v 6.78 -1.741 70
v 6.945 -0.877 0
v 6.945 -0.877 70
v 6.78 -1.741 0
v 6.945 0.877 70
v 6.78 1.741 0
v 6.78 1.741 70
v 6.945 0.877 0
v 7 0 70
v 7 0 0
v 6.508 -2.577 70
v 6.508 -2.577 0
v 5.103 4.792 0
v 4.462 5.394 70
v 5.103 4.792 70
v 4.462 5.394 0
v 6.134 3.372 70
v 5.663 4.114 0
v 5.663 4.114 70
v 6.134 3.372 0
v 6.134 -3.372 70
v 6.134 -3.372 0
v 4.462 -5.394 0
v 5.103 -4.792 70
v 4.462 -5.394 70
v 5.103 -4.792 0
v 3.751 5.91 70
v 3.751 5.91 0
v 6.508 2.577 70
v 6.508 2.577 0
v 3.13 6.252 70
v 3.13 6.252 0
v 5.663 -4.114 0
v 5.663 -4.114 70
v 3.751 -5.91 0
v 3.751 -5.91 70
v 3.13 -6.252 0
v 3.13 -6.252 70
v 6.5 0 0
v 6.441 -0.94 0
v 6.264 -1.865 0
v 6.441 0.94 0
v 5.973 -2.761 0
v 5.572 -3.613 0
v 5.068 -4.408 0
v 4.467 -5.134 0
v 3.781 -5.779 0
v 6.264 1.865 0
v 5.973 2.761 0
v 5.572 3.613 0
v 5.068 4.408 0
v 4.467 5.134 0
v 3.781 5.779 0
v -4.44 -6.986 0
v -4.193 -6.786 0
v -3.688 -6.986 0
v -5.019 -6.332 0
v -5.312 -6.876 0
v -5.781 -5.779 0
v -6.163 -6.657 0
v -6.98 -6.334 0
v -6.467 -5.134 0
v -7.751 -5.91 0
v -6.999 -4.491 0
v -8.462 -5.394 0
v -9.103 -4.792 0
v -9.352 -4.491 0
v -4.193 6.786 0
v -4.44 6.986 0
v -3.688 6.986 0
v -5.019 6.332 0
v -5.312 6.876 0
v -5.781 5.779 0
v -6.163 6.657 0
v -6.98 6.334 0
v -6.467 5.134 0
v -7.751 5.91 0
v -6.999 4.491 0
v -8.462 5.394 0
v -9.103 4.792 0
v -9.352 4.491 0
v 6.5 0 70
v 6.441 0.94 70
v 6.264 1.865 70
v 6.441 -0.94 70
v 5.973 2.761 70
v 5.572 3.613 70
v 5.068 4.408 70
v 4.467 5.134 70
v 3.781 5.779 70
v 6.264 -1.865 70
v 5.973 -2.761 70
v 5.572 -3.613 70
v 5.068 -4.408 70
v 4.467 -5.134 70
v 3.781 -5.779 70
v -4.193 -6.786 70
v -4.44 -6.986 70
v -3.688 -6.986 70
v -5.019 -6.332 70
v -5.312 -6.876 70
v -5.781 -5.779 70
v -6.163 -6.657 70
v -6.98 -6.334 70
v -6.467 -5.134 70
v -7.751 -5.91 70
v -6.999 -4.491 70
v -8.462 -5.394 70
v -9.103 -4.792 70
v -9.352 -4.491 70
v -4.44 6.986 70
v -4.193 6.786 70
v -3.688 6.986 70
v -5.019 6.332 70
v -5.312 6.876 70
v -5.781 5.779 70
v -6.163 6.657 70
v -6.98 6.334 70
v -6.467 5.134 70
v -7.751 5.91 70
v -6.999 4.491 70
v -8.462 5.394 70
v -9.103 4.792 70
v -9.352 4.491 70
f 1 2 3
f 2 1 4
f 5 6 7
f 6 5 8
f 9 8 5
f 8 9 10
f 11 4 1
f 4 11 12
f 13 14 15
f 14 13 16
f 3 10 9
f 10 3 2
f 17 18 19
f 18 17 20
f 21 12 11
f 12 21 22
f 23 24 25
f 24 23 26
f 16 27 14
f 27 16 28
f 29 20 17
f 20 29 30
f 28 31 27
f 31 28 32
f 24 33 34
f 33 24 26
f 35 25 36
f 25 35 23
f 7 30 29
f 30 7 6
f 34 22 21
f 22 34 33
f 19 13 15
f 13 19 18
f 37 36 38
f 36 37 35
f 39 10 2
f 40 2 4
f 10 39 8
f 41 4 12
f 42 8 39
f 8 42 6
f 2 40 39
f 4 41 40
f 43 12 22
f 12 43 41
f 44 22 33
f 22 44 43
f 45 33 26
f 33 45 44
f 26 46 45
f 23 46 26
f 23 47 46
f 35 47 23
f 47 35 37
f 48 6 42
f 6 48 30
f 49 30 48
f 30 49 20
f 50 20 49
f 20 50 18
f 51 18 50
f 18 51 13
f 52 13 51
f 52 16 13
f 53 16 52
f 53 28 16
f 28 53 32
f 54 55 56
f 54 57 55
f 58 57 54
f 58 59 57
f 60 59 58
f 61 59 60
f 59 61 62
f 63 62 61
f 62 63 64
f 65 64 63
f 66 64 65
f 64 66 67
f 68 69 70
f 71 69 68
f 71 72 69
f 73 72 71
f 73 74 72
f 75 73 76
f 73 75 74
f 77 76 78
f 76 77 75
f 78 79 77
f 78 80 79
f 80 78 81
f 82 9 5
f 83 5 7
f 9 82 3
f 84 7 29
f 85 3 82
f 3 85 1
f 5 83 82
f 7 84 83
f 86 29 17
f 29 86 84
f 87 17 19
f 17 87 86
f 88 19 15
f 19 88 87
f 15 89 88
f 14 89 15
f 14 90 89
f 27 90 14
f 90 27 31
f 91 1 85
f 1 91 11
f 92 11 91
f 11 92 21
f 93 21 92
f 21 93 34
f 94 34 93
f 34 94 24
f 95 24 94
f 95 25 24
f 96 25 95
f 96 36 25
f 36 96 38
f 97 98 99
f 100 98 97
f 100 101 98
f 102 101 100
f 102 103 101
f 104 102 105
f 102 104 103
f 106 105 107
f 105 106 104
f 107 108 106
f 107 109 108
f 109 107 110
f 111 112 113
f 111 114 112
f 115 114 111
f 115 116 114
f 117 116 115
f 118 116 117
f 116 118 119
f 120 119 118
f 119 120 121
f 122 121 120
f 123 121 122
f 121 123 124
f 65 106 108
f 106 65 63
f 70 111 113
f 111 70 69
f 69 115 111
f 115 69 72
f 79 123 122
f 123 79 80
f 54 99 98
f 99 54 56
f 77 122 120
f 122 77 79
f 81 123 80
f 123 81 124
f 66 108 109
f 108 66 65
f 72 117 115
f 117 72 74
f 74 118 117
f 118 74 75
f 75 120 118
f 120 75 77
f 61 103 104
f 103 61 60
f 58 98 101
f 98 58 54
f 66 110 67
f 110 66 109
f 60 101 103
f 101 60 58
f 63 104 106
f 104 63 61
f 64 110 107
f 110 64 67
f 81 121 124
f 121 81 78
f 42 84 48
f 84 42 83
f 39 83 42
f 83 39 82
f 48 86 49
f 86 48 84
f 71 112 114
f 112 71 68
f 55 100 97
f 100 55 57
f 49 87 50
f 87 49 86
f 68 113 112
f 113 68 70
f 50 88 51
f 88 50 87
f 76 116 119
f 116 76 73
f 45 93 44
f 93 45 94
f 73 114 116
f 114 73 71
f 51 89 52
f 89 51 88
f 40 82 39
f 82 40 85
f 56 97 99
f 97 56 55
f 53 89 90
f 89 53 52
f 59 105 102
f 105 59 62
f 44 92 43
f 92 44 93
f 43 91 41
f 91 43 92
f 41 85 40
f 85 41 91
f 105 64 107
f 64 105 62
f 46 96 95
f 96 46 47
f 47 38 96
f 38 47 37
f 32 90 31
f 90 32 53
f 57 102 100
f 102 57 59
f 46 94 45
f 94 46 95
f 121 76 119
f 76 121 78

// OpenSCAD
$fn = 50;


difference() {
	union() {
		cylinder(h = 70, r = 7.0000000000);
		translate(v = [-4.0000000000, 0, 0]) {
			cylinder(h = 70, r = 7.0000000000);
		}
	}
	union() {
		cylinder(h = 70, r = 3.2500000000);
		cylinder(h = 70, r = 1.8000000000);
		cylinder(h = 70, r = 1.8000000000);
		cylinder(h = 70, r = 1.8000000000);
		translate(v = [-8.5000000000, 0, 0]) {
			hull() {
				translate(v = [-3.7500000000, 0.0000000000, 0]) {
					cylinder(h = 70, r = 4.5000000000);
				}
				translate(v = [3.7500000000, 0.0000000000, 0]) {
					cylinder(h = 70, r = 4.5000000000);
				}
				translate(v = [-3.7500000000, -0.0000000000, 0]) {
					cylinder(h = 70, r = 4.5000000000);
				}
				translate(v = [3.7500000000, -0.0000000000, 0]) {
					cylinder(h = 70, r = 4.5000000000);
				}
			}
		}
		translate(v = [-1.0000000000, 0, 0.0000000000]) {
			cylinder(h = 70, r = 7.5000000000);
		}
	}
}
